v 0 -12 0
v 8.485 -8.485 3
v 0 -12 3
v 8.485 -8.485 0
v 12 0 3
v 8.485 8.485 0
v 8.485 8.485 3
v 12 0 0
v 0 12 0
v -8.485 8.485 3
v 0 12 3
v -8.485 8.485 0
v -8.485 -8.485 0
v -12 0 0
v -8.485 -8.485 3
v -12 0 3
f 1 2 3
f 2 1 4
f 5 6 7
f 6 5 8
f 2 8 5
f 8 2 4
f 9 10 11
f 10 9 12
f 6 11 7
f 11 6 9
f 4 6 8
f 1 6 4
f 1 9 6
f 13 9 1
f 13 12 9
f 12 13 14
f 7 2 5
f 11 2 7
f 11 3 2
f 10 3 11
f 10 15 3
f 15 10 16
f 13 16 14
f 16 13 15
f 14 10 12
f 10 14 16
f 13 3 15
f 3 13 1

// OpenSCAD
// file: ducket.scad
//$fn=60; // rendering option, see https://en.wikibooks.org/wiki/OpenSCAD_User_Manual/Other_Language_Features#$fa,_$fs_and_$fn

// when we make ridges, how many around the circle?  they will be evenly spaced.
crenellation_ridge_count = 60;

// creates a list of the angles pointing to the corners of of a regular polygon with the specified number of sides
function _regular_polygon_angles(nsides) = [ for (i = [0:nsides-1]) i*(360/nsides) ];
    
// creates a list of 2d coordinates defining the corners of a regular polygon with the specified number of sides
// circumscribed by a circle with the specified radius
function _regular_polygon_corners(nsides, r) = [ for (th = _regular_polygon_angles(nsides)) [r*cos(th), r*sin(th)]];

// creates a 3d regular polygon with height h circumscribed by a circle with radius r
module _regular_polygon(nsides, r, h) {
    //echo(nsides);
 	linear_extrude(height = h) polygon(_regular_polygon_corners(nsides, r));
}
 
// creates spheres at the corners of an n-sided polygon, used for bumps on top and cavities on bottom for staciking
module _corner_spheres(r, nsides, sphere_r) {
    for (corner = _regular_polygon_corners(nsides, r)) translate(corner) sphere(r = sphere_r);
}

// creates a crenellated ring that intersects with the the lip of a coin
module _crenellated_ring(r, nsides, lip_w) {
    intersection() {
        translate([0, 0, -2.5])
            difference() {
                _regular_polygon(nsides = nsides, r = r, h = 5);
                translate([0, 0, -1]) _regular_polygon(nsides = nsides, r = r - lip_w, h = 7);
            }
        for (i = [0 : crenellation_ridge_count])
            rotate([0, 0, (360 / crenellation_ridge_count) * i])
                rotate([45, 0, 0]) translate([0, -.5, -.5]) cube([r + 2, 1, 1]);
    }
}

module ducket(r = 12.7,                 // radius of circle circumscribing the ducket
                nsides = 3,             // number of sides for the ducket
                h = 3,                  // thickness of the ducket (not including any lip around it)
                lip_w = 5,              // width of raised lip around ducket, if any
                lip_h = 0,              // height of raised lip around ducket, if any
                bumps = false,          // true if stacking bumps are to be used
                crenellated = false)    // true if crenellating the lip and underside for stacking
{
    difference() {
        union() {
            _regular_polygon(nsides=nsides, r=r, h=h + lip_h);
            if (bumps)
                translate([0, 0, h + lip_h])
                    _corner_spheres(r = r - lip_w/2, 
                                    nsides = nsides, 
                                    sphere_r = lip_w / 4);
            if (crenellated)
               translate([0, 0, h + lip_h]) 
                _crenellated_ring(r = r, nsides = nsides, lip_w = lip_w);
        }
        union() {
            if (lip_h > 0) translate([0, 0, h]) _regular_polygon(nsides=nsides, r=r - lip_w, h=lip_h + 1);
            if (bumps)
                _corner_spheres(r = r - lip_w/2, 
                                nsides = nsides, 
                                sphere_r = lip_w / 4 + .4);
        }
        if (crenellated) translate([0, 0, 0]) _crenellated_ring(r = r + 0.1, nsides = nsides, lip_w = lip_w + 0.3);
    }
}
// main file
$fn=60; // rendering option, see https://en.wikibooks.org/wiki/OpenSCAD_User_Manual/Other_Language_Features#$fa,_$fs_and_$fn

use <ducket.scad>

// 8-sided, nothing fancy
ducket(nsides=8, r=12, h=3);

// same coin, but with a little lip around it
//ducket(nsides=8, r=12, h=3, lip_h=2, lip_w=2);

// same as previous, but now with crenellations for stacking
//ducket(nsides=8, r=12, h=3, lip_h=2, lip_w=2, crenellated=true);

// same as previous, but now with bumps instead of crenellations for stacking
//ducket(nsides=8, r=12, h=3, lip_h=2, lip_w=2, bumps=true);

// of course you can get silly with it
//ducket(nsides=8, r=12, h=3, lip_h=2, lip_w=7, bumps=true);

// ...or sillier
//ducket(nsides=8, r=12, h=3, lip_h=12, lip_w=7, bumps=true, crenellated=true);
